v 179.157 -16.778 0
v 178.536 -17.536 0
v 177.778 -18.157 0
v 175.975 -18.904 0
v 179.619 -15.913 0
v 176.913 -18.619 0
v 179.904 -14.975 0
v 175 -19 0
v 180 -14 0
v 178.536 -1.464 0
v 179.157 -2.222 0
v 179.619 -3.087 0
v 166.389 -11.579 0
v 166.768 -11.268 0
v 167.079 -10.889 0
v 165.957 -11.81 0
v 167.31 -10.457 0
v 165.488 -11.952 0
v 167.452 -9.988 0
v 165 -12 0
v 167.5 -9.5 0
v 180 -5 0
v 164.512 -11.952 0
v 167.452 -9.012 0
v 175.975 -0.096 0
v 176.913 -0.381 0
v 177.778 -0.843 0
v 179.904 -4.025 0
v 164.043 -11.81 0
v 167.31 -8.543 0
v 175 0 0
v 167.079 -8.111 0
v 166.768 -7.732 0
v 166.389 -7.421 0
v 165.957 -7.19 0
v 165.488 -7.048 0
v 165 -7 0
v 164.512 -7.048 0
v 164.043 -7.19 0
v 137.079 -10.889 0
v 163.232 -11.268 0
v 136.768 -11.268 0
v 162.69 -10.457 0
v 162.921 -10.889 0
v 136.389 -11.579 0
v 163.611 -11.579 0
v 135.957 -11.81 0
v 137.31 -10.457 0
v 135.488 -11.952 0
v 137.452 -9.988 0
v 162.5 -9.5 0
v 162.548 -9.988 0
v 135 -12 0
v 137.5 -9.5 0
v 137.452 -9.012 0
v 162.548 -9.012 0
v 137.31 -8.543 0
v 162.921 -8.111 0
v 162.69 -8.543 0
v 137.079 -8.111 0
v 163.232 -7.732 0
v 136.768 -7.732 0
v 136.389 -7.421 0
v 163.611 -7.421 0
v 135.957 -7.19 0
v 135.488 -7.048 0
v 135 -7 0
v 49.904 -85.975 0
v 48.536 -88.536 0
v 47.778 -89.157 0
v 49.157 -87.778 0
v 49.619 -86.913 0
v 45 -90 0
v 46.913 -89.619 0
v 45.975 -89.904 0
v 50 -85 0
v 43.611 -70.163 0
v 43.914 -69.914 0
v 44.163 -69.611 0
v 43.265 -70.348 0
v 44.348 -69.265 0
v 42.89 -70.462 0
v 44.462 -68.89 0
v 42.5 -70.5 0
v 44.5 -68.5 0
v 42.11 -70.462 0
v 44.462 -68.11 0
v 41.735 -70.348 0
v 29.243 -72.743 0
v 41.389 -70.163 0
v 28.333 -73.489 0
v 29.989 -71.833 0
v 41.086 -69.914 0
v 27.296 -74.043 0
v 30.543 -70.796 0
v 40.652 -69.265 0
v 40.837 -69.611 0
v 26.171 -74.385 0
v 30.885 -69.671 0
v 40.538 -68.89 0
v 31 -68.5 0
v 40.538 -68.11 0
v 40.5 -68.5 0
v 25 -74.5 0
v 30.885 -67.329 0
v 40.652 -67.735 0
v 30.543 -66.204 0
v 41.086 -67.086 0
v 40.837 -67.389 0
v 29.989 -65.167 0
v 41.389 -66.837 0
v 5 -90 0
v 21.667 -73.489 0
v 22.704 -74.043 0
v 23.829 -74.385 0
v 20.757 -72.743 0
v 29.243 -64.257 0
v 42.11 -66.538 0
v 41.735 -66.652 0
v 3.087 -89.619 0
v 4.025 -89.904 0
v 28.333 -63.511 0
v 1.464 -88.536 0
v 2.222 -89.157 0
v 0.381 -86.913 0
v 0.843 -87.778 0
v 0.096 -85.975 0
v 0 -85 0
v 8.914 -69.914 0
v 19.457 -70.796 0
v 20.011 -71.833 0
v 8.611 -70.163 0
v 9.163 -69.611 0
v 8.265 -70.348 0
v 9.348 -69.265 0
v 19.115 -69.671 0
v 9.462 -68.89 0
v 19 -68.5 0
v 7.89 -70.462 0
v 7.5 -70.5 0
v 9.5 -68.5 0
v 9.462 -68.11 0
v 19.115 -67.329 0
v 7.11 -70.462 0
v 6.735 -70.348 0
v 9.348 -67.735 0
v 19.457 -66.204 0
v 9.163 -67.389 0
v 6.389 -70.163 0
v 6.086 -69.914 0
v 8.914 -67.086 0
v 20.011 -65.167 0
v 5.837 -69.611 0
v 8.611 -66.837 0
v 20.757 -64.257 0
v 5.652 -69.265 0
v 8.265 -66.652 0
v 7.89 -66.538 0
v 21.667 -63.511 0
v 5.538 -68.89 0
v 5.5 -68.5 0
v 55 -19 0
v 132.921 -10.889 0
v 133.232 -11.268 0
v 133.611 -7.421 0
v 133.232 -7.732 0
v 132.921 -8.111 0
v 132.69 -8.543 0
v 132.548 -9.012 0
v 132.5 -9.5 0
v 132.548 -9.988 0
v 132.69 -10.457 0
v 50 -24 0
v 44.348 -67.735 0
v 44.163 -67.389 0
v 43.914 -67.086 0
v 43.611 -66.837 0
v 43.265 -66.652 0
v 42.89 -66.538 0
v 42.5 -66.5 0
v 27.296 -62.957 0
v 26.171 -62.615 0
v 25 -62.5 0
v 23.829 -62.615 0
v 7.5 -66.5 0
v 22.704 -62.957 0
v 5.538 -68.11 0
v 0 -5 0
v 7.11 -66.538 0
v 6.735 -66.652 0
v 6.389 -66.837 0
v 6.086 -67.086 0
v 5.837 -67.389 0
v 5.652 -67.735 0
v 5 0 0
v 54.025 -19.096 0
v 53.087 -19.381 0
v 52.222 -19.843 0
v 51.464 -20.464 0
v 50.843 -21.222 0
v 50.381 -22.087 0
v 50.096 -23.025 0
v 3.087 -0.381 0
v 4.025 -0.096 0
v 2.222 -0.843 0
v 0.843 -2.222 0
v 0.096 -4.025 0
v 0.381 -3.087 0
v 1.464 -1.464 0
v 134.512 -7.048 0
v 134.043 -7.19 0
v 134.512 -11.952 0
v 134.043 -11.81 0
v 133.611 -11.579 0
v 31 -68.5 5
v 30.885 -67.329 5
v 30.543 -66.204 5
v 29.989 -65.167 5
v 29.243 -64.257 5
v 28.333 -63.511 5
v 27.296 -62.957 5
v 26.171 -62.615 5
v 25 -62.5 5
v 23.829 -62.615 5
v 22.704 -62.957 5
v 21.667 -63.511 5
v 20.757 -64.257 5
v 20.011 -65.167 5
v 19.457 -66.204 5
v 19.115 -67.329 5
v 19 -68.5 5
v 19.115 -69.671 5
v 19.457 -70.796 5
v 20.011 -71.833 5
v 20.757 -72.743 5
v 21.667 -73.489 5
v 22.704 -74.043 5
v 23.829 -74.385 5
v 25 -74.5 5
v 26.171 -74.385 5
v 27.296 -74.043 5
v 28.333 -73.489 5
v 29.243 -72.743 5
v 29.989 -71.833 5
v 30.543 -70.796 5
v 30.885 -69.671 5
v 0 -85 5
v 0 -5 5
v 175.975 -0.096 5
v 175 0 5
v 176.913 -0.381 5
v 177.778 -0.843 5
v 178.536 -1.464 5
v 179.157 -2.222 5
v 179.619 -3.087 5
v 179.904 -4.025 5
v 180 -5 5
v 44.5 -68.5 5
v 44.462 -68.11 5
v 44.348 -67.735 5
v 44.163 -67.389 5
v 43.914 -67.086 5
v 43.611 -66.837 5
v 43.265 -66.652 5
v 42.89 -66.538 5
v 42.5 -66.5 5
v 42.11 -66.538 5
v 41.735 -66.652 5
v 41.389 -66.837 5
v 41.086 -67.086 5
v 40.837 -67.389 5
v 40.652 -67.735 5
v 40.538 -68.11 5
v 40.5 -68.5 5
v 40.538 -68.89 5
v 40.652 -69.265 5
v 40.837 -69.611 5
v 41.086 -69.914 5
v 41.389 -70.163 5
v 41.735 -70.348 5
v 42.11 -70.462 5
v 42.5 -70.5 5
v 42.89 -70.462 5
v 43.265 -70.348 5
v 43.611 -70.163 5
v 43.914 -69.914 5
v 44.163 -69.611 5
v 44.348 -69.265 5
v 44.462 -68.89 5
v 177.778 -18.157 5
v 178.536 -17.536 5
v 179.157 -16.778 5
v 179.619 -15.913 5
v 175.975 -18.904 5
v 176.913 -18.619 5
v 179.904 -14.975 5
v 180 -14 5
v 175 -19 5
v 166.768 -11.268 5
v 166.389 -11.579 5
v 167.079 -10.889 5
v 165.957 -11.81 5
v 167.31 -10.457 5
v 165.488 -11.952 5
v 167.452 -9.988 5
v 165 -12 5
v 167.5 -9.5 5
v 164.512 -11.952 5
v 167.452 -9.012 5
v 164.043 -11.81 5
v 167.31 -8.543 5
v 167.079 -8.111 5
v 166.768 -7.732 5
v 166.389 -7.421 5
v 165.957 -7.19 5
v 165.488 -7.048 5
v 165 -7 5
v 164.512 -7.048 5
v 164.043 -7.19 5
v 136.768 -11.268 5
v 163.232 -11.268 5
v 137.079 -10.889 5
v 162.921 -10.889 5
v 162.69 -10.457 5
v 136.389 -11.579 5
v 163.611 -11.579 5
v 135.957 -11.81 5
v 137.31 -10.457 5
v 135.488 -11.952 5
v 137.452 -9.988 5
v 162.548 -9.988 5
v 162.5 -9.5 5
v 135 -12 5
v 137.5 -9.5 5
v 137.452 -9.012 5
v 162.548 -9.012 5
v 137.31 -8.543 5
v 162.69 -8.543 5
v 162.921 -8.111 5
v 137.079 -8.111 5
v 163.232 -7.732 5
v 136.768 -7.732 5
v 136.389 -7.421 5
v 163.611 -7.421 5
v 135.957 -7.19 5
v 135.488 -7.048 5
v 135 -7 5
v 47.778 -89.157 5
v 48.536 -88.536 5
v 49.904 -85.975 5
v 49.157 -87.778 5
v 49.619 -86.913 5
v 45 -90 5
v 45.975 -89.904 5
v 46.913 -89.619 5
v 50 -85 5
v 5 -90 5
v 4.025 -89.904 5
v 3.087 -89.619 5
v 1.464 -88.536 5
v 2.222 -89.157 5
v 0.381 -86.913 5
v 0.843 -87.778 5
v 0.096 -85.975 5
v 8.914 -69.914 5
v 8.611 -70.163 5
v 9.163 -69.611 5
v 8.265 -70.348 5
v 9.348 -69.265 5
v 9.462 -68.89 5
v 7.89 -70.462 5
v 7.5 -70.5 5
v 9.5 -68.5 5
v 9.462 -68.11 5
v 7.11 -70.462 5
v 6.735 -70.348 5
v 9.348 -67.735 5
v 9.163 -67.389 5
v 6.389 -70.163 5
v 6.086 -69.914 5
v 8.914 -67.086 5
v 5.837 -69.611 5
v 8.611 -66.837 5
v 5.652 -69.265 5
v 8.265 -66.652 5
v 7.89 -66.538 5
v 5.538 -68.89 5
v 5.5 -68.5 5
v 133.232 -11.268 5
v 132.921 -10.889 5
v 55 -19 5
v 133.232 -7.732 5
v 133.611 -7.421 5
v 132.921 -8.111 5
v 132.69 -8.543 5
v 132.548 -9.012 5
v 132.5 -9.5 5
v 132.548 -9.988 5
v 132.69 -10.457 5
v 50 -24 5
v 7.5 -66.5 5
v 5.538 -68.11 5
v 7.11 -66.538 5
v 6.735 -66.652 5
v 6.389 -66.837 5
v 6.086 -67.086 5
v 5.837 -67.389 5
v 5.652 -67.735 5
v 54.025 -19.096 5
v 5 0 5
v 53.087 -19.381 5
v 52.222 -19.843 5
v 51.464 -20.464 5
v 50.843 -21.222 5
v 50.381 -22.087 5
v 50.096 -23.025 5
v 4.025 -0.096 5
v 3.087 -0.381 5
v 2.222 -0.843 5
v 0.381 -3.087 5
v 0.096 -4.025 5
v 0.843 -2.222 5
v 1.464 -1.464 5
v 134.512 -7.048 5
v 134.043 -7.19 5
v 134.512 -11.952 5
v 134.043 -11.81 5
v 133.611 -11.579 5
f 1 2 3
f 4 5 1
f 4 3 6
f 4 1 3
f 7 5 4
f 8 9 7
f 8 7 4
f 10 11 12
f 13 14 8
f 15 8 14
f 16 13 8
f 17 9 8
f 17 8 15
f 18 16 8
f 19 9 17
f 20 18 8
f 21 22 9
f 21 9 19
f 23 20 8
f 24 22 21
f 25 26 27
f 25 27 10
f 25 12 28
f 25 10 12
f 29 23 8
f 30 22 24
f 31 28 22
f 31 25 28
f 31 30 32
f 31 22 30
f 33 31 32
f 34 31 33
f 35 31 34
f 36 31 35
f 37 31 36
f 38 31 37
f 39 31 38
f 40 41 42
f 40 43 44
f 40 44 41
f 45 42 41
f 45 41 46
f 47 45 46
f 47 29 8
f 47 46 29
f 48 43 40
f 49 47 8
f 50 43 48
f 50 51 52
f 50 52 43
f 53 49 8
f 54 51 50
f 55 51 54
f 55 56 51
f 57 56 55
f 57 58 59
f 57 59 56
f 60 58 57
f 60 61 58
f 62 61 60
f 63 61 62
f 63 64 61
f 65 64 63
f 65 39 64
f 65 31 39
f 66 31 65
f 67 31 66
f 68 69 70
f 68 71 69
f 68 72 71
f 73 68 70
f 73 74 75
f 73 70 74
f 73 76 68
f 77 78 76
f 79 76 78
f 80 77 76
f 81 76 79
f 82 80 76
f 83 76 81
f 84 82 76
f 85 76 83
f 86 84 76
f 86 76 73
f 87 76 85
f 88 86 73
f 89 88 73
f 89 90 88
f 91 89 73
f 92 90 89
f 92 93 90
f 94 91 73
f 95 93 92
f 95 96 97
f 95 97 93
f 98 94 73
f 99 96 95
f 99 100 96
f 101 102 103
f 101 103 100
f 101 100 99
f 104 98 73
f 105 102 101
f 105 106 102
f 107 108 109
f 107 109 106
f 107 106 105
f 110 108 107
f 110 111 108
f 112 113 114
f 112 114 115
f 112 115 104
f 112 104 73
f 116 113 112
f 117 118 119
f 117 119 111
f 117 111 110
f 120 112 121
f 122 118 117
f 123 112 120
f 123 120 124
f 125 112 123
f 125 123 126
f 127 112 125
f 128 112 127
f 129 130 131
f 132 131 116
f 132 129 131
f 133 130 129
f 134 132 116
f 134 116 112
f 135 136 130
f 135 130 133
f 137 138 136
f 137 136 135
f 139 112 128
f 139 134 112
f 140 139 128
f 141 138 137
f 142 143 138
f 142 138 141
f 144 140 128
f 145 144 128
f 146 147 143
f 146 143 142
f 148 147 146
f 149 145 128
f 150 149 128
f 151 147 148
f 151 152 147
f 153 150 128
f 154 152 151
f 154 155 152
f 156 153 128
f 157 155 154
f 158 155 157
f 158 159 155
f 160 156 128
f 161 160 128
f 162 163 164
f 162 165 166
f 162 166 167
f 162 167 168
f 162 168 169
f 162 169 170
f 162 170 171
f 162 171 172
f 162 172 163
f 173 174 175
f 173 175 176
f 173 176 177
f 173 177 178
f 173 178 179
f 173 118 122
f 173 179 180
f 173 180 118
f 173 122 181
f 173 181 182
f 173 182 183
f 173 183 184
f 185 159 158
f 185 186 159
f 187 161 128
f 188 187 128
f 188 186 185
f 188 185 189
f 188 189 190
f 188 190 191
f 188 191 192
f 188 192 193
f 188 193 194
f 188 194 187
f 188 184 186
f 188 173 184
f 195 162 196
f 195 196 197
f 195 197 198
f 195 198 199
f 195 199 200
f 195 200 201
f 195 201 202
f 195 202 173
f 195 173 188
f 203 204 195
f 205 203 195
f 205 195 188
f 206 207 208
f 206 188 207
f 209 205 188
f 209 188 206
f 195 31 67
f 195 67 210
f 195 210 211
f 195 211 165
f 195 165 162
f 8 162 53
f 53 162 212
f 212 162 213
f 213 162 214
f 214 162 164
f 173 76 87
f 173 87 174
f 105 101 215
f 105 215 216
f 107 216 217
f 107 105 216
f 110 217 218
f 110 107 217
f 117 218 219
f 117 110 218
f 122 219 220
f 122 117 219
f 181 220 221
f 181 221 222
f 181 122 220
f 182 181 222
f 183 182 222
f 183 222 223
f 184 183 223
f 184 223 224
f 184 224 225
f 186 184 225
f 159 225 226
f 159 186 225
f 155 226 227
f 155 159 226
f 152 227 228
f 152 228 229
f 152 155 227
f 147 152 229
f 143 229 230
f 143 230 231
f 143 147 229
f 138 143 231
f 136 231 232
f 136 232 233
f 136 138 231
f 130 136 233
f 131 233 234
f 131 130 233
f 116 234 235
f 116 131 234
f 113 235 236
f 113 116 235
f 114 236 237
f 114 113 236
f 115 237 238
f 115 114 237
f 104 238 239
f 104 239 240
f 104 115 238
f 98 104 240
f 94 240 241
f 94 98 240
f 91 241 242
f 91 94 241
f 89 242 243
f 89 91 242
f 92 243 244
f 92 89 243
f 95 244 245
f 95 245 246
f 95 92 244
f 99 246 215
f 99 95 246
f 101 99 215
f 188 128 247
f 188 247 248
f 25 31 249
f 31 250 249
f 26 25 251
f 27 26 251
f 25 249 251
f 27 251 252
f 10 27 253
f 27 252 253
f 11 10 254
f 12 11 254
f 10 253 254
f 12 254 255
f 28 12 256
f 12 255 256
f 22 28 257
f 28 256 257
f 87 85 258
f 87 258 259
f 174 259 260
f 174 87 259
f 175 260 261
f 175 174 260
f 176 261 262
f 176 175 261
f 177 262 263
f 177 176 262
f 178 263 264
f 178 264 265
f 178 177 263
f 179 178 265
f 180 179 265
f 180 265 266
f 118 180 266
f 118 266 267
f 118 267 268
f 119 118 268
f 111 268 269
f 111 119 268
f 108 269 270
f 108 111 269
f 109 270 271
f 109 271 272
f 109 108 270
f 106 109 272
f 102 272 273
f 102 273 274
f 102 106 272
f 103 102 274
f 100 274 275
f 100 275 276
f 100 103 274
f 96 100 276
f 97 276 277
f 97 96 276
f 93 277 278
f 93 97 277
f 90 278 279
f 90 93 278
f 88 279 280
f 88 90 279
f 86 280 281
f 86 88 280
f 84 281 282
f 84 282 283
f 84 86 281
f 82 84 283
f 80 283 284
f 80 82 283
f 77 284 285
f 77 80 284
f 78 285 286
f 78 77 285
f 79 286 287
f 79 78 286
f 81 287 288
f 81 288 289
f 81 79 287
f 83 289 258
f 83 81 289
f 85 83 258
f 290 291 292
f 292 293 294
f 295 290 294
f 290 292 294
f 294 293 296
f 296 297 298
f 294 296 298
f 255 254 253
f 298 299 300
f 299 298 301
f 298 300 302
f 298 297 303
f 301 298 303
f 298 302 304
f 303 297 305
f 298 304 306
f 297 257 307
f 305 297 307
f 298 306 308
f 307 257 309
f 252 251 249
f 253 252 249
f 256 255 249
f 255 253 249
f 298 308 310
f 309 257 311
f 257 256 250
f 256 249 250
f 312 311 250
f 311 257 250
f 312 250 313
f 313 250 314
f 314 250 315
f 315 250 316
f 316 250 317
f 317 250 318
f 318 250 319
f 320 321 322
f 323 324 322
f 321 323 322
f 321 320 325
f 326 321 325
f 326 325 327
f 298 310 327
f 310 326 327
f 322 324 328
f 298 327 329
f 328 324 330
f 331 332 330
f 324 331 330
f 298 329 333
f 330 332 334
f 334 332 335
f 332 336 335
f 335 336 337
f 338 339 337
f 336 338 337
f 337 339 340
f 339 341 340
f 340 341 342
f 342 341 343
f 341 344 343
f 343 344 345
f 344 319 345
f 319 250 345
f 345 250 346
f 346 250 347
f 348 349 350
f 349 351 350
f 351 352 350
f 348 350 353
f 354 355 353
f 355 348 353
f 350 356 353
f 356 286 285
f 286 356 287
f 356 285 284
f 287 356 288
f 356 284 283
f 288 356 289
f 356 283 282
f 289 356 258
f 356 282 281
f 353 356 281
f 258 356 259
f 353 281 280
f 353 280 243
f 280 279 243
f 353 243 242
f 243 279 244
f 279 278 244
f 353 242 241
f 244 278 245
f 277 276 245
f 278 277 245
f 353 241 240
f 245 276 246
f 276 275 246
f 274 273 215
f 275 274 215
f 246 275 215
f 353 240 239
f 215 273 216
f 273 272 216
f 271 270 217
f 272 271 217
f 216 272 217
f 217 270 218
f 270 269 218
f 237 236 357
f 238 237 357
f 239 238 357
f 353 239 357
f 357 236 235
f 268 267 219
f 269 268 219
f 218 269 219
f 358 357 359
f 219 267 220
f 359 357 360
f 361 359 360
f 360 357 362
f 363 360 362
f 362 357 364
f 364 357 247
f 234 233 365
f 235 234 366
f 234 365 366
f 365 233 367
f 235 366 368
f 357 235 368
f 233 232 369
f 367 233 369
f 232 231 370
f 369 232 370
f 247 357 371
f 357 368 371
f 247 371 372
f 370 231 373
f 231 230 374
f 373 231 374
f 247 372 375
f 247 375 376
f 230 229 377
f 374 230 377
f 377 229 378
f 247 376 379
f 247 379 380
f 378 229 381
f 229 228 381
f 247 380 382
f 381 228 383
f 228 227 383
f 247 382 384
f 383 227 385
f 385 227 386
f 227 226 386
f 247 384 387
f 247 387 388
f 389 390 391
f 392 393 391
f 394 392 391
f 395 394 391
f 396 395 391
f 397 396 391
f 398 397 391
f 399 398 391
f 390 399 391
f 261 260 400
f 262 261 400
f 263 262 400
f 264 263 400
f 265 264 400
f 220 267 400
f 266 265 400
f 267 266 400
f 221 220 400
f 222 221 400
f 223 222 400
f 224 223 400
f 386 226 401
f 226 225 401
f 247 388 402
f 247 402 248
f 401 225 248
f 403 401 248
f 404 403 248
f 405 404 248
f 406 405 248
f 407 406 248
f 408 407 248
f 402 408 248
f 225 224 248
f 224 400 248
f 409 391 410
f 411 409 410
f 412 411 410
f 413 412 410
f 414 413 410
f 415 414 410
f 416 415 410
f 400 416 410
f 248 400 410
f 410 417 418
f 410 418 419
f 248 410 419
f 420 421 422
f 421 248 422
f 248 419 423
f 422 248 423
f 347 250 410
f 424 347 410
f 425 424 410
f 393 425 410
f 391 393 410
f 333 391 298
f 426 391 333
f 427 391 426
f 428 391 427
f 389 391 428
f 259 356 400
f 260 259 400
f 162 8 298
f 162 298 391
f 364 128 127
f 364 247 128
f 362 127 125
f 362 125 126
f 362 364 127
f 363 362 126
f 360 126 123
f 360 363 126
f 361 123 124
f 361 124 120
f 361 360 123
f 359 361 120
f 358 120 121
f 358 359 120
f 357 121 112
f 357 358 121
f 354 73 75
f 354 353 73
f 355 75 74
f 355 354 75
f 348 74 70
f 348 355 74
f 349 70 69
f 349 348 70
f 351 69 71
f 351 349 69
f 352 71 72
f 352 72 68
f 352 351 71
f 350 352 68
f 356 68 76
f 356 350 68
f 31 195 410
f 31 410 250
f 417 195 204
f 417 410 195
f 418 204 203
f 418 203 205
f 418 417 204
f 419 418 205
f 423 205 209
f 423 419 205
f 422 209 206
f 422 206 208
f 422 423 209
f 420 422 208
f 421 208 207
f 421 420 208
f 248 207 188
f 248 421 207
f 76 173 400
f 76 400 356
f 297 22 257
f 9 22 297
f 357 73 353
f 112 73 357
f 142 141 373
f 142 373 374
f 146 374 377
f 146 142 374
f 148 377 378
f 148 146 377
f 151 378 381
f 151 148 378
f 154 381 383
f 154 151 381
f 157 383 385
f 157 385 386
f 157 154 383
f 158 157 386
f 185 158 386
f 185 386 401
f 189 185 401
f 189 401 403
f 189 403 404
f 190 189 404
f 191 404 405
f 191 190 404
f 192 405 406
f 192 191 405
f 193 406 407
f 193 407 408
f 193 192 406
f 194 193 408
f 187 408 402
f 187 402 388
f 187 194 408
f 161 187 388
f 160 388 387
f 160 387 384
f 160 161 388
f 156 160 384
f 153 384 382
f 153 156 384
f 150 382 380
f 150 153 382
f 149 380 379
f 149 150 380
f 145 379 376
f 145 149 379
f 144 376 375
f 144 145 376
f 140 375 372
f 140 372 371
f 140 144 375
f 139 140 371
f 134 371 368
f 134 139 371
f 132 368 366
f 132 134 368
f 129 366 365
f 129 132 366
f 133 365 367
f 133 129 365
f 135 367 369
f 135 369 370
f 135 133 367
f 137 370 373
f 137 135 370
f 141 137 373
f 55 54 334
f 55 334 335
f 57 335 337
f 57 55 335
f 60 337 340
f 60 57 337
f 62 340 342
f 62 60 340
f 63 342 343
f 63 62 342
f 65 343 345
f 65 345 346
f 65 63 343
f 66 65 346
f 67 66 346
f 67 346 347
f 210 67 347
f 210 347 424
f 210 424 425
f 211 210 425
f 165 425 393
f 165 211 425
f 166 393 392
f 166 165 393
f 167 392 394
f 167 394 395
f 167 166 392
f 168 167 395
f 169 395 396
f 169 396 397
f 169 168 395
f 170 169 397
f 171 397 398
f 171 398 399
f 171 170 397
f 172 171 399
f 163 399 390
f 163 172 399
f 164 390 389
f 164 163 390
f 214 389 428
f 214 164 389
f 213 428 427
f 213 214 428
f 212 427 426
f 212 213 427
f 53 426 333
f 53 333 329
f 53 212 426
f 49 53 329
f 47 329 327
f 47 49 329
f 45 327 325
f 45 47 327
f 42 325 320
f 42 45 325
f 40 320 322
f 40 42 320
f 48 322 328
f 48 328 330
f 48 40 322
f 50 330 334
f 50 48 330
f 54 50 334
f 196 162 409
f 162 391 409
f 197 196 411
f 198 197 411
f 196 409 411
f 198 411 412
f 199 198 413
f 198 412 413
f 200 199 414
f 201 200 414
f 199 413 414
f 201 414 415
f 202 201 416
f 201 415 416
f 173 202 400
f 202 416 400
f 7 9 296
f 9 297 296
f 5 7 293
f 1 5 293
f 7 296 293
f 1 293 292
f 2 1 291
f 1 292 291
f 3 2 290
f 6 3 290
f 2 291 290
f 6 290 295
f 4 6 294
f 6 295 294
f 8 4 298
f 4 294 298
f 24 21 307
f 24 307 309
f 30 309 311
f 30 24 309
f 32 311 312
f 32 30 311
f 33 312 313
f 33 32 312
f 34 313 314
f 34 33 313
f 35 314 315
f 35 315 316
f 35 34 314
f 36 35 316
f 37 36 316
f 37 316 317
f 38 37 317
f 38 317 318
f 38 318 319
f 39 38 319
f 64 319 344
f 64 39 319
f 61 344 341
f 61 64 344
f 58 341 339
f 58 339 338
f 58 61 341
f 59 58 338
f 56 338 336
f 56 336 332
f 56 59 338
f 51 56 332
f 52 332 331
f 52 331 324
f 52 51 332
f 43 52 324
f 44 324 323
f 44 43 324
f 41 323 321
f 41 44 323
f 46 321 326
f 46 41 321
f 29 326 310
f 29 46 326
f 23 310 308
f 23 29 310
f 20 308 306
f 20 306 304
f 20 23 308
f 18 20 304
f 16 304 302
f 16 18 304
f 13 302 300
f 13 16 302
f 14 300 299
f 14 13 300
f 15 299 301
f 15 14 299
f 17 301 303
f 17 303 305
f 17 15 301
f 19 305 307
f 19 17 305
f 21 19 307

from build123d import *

# Parameters (mm, degrees)
SKETCH1_R           = 2.5
SKETCH1_R_2         = 6
SKETCH1_R_3         = 2
BOSS_EXTRUDE1_DEPTH = 5
FILLET1_R           = 5


with BuildPart() as part:
    # Sketch1 → Boss-Extrude1 (new body)
    with BuildSketch(Plane.XY):
        Polygon((0, 0), (180, 0), (180, -19), (50, -19), (50, -90), (0, -90), align=None)
        with Locations((135, -9.5)):
            Circle(SKETCH1_R, mode=Mode.SUBTRACT)
        with Locations((165, -9.5)):
            Circle(SKETCH1_R, mode=Mode.SUBTRACT)
        with Locations((25, -68.5)):
            Circle(SKETCH1_R_2, mode=Mode.SUBTRACT)
        with Locations((7.5, -68.5)):
            Circle(SKETCH1_R_3, mode=Mode.SUBTRACT)
        with Locations((42.5, -68.5)):
            Circle(SKETCH1_R_3, mode=Mode.SUBTRACT)
    extrude(amount=BOSS_EXTRUDE1_DEPTH)

    # Fillet1
    fillet1_edges = [part.edges().sort_by_distance(p)[0] for p in [
        (0, 0, 2.5),
        (180, 0, 2.5),
        (180, -19, 2.5),
        (50, -19, 2.5),
        (50, -90, 2.5),
        (0, -90, 2.5),
    ]]
    fillet(fillet1_edges, radius=FILLET1_R)


solid = part.part
